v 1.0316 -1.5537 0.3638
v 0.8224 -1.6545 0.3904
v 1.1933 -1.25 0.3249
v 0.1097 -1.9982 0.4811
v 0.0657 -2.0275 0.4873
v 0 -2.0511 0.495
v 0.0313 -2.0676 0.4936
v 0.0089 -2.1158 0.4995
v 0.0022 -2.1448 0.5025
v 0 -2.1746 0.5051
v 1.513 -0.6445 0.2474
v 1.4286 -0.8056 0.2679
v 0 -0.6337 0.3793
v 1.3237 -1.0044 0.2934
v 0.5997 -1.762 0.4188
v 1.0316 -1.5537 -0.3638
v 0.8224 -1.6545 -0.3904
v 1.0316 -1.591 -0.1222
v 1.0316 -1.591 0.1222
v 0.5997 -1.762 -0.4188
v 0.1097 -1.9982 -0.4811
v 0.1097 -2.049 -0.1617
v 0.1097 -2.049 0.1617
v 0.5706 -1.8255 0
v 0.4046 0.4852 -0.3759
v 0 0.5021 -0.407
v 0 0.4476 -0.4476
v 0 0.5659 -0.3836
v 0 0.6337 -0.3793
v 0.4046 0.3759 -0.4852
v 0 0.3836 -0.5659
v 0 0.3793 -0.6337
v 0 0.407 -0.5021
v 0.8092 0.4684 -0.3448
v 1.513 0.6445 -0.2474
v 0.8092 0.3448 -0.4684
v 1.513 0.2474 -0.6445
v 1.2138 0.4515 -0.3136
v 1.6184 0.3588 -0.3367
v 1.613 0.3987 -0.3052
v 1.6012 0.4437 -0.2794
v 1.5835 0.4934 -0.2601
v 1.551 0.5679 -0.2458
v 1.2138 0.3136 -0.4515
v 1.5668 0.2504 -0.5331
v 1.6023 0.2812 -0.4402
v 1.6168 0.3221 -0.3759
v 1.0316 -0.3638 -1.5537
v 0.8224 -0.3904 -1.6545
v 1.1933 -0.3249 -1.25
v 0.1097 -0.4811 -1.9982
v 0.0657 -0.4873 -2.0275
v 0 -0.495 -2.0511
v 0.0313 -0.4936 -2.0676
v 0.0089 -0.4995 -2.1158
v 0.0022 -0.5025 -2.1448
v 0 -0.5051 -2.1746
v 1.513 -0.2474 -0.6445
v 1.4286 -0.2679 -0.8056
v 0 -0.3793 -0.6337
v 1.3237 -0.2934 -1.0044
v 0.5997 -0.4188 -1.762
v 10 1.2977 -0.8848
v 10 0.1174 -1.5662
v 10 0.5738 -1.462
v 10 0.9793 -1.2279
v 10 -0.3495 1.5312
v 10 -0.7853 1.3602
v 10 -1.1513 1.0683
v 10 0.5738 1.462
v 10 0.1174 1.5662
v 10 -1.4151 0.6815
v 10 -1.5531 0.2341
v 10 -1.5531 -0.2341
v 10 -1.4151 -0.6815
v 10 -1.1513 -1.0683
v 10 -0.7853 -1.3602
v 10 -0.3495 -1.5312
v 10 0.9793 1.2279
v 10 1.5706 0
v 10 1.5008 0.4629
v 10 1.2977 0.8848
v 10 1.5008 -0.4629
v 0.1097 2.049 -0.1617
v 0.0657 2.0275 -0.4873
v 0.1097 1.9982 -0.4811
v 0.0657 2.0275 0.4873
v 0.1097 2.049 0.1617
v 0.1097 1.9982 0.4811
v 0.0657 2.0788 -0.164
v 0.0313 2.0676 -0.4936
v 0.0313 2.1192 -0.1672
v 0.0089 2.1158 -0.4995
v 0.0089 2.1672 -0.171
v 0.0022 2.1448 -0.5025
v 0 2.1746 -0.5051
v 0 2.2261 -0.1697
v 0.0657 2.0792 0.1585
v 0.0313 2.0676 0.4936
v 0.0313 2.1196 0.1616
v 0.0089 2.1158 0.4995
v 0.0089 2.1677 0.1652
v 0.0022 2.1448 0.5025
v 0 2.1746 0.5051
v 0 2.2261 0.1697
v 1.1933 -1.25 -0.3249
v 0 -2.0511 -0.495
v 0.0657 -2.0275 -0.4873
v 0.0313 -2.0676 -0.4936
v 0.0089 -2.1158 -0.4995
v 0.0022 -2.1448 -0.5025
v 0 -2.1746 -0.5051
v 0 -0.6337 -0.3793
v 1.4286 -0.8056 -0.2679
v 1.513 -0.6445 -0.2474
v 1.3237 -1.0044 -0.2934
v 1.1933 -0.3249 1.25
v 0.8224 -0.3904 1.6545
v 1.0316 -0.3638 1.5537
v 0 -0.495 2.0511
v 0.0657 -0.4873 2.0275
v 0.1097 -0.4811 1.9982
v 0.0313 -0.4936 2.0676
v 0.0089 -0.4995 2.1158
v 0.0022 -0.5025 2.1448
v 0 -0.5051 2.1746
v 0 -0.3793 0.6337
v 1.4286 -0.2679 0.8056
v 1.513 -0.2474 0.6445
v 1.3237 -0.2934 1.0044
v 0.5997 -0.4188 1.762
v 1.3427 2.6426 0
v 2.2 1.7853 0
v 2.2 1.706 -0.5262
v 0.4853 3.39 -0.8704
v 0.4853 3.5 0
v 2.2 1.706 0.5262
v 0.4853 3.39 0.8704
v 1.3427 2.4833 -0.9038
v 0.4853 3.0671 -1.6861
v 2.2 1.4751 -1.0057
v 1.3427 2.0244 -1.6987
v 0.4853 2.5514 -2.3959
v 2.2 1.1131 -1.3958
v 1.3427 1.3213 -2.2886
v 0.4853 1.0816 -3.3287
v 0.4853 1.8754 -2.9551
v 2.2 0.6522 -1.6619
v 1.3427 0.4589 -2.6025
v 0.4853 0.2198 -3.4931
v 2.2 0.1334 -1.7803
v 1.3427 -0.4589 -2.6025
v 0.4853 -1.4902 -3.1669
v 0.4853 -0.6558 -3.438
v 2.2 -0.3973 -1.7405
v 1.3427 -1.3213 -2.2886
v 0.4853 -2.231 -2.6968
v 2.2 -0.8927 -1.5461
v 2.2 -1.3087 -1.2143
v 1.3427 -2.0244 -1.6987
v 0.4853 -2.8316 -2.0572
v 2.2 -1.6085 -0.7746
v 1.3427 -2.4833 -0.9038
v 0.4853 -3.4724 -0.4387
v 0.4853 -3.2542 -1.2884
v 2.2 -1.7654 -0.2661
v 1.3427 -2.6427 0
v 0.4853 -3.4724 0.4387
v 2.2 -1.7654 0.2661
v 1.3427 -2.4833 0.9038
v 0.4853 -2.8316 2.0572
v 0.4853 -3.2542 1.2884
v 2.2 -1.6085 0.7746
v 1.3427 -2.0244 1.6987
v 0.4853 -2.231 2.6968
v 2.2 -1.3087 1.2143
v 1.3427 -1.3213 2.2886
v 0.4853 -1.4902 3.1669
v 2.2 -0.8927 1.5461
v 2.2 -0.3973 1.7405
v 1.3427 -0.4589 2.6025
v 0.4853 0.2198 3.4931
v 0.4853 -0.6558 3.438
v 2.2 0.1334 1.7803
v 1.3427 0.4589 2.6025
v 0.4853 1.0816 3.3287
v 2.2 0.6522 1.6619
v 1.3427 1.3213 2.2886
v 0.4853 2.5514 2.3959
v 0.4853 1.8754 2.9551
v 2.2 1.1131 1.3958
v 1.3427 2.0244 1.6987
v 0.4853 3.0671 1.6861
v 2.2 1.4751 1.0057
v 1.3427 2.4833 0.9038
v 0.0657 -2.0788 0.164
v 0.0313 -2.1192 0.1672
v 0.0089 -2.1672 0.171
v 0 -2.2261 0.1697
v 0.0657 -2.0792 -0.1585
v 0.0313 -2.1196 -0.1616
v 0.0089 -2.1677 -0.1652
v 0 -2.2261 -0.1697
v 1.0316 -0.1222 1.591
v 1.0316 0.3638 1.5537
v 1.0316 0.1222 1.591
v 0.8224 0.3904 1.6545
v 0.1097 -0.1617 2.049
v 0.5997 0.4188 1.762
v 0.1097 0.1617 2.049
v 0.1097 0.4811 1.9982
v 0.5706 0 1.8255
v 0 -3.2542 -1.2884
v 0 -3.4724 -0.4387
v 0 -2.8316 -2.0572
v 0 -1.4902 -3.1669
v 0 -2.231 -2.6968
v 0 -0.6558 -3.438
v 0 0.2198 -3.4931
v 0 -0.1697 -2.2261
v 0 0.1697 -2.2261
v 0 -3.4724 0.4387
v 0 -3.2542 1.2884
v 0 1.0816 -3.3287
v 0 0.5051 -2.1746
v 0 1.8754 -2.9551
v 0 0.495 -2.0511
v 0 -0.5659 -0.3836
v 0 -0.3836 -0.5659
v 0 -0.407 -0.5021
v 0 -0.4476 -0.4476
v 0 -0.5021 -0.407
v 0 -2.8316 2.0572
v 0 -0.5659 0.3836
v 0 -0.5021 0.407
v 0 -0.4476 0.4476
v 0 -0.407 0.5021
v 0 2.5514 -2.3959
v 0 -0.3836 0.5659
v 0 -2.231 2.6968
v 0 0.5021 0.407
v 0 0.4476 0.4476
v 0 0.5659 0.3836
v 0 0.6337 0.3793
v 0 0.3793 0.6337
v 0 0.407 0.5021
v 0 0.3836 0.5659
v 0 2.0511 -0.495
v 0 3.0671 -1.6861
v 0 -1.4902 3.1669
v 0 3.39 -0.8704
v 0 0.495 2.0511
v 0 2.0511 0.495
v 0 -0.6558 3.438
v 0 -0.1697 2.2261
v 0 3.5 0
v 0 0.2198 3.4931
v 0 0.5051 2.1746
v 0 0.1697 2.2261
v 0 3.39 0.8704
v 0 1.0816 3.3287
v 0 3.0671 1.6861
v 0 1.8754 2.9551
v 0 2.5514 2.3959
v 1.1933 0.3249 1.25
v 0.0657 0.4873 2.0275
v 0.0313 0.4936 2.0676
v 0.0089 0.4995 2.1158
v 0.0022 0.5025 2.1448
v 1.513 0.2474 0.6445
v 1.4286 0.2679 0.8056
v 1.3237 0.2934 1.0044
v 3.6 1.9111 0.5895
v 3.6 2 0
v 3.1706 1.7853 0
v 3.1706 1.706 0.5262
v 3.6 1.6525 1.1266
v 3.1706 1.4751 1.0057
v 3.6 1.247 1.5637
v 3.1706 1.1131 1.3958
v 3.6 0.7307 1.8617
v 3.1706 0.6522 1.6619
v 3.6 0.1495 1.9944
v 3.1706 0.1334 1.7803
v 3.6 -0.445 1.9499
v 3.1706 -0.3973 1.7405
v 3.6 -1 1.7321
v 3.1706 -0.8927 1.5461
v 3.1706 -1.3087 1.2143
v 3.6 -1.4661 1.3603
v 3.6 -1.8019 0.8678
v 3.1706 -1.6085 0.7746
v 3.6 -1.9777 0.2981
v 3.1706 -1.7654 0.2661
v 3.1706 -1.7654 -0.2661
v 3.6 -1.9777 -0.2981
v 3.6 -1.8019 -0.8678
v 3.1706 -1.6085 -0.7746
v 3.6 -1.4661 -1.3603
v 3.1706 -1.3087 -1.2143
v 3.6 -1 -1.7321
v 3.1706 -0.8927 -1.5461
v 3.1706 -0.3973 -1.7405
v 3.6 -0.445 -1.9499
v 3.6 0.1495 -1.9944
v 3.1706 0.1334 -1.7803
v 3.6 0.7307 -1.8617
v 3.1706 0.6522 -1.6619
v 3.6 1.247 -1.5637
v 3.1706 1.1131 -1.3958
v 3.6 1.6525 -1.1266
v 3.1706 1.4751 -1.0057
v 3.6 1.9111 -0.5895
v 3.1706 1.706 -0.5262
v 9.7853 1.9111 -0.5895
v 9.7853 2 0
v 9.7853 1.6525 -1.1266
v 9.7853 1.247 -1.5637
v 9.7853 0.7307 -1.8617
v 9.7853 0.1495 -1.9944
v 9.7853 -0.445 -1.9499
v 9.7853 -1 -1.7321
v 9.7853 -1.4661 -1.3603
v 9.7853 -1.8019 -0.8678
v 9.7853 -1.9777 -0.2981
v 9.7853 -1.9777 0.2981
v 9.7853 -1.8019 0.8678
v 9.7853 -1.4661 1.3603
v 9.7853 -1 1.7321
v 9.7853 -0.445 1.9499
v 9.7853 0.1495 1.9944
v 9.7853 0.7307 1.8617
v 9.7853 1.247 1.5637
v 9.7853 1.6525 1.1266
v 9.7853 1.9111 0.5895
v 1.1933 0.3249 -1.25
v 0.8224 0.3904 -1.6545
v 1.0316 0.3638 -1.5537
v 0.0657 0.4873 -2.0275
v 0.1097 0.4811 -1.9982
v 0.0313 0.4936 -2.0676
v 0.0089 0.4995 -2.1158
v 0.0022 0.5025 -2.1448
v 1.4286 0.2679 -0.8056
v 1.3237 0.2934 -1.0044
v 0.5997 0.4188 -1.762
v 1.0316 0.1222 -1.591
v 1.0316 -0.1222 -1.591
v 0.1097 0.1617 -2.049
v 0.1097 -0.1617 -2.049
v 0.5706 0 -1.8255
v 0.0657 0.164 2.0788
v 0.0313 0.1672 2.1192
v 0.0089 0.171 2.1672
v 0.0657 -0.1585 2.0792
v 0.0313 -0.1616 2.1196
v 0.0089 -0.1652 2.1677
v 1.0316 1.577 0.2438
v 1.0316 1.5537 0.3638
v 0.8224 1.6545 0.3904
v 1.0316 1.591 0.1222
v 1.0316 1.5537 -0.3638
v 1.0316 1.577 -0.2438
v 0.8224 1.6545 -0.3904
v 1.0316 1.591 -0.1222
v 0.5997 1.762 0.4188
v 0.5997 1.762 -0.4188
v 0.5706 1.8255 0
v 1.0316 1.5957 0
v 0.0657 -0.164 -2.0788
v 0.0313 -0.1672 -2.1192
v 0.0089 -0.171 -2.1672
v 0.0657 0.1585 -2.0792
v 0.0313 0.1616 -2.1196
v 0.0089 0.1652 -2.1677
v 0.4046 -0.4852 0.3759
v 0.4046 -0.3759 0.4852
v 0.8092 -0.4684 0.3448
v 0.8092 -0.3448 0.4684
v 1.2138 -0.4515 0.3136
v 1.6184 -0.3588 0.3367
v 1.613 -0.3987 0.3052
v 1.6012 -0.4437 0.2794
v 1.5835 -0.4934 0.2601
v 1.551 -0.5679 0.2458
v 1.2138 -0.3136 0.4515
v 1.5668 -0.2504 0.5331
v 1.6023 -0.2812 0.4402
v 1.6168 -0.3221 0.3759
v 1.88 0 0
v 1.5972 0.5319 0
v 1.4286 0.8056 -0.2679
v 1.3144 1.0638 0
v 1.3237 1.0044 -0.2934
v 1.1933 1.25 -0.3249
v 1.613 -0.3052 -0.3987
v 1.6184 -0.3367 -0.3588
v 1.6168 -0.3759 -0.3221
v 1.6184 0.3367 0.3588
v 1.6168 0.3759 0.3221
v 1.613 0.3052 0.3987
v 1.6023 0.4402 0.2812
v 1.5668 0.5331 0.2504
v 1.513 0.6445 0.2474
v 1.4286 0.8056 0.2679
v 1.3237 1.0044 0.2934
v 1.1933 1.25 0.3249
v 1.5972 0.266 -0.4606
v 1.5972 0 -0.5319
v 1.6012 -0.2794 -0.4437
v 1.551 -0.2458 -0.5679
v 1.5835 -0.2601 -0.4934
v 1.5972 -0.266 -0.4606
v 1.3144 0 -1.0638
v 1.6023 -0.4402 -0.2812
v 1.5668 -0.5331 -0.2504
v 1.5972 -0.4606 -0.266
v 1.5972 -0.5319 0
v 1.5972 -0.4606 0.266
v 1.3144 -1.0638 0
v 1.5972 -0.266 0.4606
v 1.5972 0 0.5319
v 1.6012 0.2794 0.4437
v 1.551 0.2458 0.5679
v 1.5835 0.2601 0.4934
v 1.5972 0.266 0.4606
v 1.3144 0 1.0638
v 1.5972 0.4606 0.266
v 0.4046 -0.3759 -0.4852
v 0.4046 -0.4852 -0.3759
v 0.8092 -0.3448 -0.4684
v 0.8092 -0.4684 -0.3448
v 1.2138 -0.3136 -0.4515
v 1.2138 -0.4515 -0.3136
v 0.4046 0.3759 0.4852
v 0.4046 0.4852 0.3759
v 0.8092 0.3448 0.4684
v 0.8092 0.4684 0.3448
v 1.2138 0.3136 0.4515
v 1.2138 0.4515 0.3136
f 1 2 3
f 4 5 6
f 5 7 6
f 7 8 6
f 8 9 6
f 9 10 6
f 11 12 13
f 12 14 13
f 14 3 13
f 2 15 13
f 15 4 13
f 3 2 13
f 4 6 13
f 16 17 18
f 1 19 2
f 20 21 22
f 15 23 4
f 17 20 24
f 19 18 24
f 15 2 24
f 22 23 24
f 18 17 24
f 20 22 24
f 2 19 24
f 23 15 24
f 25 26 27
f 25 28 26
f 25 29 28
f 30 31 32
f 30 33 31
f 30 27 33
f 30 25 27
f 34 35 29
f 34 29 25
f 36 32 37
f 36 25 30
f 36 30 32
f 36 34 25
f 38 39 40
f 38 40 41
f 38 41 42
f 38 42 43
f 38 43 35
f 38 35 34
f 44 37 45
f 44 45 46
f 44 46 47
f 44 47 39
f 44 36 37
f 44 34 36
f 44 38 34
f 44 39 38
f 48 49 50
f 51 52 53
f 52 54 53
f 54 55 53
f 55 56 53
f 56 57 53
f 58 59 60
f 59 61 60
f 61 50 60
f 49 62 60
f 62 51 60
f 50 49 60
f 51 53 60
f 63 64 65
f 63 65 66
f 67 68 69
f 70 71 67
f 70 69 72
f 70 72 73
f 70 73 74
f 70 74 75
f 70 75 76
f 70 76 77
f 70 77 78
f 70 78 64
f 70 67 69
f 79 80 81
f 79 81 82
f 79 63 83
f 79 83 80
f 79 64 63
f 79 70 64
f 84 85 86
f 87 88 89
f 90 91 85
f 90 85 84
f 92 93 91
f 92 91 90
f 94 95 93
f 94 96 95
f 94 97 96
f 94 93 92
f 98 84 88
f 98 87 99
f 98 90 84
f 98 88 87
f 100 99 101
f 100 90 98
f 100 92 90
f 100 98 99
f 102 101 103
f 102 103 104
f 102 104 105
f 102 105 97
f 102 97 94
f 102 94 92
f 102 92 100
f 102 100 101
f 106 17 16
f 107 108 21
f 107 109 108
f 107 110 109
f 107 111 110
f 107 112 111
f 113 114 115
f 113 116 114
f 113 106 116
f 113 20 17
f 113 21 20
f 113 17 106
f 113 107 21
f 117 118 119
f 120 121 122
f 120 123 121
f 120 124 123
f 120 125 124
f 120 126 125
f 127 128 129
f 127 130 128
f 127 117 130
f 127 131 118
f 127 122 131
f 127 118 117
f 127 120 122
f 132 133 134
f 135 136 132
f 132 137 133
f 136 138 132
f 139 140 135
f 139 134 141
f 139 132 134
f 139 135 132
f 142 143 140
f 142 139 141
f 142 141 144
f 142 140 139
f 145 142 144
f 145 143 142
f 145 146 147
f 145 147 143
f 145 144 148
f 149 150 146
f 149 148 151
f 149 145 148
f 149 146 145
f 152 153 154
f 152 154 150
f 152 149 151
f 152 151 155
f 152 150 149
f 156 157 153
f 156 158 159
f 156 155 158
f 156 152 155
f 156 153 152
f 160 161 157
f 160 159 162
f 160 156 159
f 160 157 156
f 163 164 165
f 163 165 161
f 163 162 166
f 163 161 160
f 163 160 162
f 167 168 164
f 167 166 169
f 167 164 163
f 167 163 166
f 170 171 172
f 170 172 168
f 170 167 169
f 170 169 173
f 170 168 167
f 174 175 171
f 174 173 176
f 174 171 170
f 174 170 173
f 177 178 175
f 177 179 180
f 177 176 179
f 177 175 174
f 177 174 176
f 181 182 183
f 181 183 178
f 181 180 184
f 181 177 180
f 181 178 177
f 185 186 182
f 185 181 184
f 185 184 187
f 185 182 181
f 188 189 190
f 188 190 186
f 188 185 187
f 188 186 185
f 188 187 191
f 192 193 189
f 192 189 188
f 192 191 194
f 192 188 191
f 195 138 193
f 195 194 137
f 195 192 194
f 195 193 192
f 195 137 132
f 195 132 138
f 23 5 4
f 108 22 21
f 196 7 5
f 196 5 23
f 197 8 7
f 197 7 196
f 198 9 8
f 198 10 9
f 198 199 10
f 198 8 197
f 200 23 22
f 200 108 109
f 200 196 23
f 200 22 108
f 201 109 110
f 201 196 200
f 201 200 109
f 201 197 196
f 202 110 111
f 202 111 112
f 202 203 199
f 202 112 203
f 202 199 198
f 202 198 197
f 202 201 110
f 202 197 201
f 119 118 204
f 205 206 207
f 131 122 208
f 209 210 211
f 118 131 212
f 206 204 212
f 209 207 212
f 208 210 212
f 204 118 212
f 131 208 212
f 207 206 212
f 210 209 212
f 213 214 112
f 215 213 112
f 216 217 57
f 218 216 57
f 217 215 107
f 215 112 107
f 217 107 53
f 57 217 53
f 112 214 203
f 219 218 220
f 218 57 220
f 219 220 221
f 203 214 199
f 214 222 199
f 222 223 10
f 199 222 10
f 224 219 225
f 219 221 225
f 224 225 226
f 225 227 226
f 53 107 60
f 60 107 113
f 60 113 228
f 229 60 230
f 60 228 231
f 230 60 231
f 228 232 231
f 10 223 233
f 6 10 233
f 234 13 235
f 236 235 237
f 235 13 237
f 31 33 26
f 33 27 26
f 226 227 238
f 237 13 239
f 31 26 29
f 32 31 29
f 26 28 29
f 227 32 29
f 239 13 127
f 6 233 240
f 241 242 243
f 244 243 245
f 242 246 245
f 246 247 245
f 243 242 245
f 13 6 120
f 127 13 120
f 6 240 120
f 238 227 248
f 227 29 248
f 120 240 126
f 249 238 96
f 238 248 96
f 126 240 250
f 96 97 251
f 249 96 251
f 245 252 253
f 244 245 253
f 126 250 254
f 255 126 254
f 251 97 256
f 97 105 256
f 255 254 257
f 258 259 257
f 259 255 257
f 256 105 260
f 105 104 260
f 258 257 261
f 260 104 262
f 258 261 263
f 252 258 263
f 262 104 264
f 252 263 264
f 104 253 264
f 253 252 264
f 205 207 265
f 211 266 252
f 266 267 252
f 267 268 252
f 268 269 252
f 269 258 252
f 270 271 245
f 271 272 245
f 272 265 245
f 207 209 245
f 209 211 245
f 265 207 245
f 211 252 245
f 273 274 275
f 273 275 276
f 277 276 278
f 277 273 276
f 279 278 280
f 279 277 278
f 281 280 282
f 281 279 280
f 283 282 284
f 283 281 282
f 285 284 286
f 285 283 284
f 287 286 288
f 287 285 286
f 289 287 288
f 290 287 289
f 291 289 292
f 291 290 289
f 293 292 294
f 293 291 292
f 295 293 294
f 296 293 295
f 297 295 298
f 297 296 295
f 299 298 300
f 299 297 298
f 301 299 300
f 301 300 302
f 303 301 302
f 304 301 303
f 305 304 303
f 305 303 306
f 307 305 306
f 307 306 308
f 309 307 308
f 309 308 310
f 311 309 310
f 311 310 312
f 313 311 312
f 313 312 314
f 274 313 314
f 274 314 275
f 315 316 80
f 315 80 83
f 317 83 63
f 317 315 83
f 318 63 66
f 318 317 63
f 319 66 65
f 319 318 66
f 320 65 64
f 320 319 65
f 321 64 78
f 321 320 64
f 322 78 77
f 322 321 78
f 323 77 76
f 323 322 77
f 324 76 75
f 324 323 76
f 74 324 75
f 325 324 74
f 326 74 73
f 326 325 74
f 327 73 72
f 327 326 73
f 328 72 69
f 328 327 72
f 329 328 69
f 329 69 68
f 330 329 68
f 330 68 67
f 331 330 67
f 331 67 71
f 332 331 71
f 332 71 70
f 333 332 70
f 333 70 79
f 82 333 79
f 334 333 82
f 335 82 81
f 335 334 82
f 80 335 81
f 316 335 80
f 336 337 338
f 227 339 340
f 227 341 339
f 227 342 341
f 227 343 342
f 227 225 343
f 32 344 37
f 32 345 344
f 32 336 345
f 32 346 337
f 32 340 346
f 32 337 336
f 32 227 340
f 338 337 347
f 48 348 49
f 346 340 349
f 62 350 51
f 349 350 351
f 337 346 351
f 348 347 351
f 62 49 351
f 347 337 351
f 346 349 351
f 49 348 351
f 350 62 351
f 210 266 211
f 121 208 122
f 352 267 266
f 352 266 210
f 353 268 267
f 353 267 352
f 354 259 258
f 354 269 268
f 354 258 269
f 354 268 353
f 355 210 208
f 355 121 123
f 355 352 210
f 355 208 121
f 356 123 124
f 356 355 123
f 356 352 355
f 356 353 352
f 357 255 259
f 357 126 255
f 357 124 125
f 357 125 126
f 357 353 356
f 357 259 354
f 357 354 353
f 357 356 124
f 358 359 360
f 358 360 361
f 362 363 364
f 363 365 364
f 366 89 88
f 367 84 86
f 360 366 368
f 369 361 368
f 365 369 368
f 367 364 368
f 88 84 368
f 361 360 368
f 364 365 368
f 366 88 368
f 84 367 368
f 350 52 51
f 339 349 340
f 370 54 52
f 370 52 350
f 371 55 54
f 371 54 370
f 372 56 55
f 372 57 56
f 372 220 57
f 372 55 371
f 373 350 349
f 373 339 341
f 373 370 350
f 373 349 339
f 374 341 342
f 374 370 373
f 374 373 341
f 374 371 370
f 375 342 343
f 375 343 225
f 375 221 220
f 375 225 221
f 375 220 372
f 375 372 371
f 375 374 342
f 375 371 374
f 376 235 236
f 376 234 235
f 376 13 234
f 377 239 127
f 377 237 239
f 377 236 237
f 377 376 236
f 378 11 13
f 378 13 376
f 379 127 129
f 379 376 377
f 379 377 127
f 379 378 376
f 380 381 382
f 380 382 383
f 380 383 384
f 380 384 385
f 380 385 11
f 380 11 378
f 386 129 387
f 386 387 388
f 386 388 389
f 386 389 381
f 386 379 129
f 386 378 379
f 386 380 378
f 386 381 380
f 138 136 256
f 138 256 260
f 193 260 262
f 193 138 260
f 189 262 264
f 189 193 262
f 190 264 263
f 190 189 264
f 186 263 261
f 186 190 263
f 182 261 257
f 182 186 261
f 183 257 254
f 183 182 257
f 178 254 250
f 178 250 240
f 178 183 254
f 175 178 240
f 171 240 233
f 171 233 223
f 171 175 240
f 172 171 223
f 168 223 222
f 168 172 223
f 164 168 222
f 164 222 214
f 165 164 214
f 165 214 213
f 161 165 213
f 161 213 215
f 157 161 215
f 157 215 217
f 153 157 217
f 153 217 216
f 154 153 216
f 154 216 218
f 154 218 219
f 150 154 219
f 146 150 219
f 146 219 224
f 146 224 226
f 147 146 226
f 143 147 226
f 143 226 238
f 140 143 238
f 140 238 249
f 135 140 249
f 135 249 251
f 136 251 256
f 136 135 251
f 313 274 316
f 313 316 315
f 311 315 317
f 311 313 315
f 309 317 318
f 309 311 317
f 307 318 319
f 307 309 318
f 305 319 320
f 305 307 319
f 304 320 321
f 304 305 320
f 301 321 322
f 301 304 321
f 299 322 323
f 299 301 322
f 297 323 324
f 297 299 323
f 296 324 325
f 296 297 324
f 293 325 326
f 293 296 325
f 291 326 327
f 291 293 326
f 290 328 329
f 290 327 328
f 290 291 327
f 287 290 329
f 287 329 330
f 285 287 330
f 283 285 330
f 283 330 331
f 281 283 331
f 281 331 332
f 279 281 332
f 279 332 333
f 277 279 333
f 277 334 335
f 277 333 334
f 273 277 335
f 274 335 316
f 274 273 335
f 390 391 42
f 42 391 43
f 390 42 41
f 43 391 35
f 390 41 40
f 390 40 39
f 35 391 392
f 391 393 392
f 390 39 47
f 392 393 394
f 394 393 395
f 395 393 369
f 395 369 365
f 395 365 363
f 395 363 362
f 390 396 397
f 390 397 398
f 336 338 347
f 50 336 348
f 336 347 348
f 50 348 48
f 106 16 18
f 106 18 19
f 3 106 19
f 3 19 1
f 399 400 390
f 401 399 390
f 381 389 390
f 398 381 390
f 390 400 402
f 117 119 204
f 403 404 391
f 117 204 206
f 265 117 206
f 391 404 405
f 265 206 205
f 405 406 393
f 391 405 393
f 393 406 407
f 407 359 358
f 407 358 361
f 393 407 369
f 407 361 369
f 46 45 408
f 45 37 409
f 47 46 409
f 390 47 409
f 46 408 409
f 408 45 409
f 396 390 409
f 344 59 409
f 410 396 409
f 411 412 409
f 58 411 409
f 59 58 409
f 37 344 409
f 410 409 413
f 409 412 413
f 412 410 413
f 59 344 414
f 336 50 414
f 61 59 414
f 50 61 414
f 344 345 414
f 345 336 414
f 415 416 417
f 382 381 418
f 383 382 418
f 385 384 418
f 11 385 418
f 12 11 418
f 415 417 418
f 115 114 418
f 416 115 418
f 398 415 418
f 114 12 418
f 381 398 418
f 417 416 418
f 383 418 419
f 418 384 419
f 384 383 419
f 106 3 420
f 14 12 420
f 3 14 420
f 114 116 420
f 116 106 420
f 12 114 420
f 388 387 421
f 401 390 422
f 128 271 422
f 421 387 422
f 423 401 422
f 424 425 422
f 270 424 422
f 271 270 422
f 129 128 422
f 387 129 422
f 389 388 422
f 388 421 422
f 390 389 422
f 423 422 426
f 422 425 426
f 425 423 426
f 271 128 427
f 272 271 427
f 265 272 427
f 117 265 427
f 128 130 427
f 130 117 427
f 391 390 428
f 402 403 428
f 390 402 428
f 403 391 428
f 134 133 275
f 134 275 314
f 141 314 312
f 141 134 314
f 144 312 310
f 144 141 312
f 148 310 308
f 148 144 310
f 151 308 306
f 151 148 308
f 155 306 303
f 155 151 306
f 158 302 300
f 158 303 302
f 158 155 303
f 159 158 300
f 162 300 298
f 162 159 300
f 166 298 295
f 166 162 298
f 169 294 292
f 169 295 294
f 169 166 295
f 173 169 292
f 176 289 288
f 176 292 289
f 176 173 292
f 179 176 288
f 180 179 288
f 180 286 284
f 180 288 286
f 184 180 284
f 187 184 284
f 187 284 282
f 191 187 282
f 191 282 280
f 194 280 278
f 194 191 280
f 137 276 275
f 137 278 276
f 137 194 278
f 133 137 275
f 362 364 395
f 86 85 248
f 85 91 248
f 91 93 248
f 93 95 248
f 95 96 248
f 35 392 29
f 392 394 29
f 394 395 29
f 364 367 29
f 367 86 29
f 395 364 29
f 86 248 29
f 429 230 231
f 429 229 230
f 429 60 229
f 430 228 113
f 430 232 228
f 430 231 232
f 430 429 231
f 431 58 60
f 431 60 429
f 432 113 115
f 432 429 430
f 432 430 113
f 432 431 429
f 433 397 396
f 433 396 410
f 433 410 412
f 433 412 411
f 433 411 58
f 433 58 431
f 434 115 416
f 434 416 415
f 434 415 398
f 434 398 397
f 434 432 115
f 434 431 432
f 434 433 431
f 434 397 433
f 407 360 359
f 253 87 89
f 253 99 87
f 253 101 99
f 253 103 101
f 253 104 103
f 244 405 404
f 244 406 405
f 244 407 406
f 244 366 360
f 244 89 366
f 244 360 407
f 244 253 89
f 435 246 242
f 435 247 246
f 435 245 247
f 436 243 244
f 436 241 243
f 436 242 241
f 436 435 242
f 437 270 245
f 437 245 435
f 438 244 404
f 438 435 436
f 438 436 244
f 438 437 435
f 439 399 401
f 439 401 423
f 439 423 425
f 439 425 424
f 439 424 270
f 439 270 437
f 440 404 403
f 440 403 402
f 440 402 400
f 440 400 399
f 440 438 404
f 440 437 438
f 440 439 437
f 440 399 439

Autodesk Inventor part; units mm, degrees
ref_plane "YZ Plane" through (0, 0, 0) normal (1, 0, 0) x (0, 1, 0)
ref_plane "XZ Plane" through (0, 0, 0) normal (0, 1, 0) x (-1, 0, 0)
sketch "Sketch1" plane through (0, 0, 0) normal (0, 0, 1) x (1, 0, 0)
  line L0 (1.88, 0) -> (10, 0)
  line L1 (10, 0) -> (10, 2)
  line L2 (10, 2) -> (3.6, 2)
  line L3 (3.6, 2) -> (3.1706, 1.7853)
  line L4 (3.1706, 1.7853) -> (2.2, 1.7853)
  line L5 (0, 3.5) -> (0, 2.11)
  line L6 (0, 2.11) -> (1.0316, 1.5957)
  line L7 (1.0316, 1.5957) -> (1.88, 0)
  line L8 (-2, 0) -> (12, 0) projected
  line L9 (0, -0.7) -> (0, 4.2) projected
  line L10 (0, 3.5) -> (0.4853, 3.5)
  line L11 (0.4853, 3.5) -> (2.2, 1.7853)
  line L12 (3.6, 2) -> (1.9853, 2) construction
  dimension "d1" = 6.4
  dimension "d2" = 4
  dimension "d3" = 3.5706
  dimension "d4" = 4.22
  dimension "d5" = 26.5
  dimension "d6" = 62
  dimension "d7" = 1.88
  dimension "d8" = 0.4294
  dimension "d12" = 7
  dimension "d13" = 45
  dimension "d15" = 10
  dimension "d24" = 2.2
revolve "Body" add sketch "Sketch1" angle 360 about axis through (1.88, 0, 0) along (1, 0, 0) contours L7 L6 L5 L10 L11 L4 L3 L2 L1 L0
sketch "Sketch2" plane through (0, 0, 0) normal (-1, 0, 0) x (0, 0, 1)
  line L0 (0, 2.11) -> (0, 0) construction
  line L1 (0, 0) -> (2.11, 0) construction
  arc A0 (0.633, 0) -> (0, 0.633) centre (0, 0) ccw construction
  arc A1 (0.7385, 0) -> (0, 0.7385) centre (0, 0) ccw construction
  arc A2 (2.0511, 0.495) -> (0.495, 2.0511) centre (0, 0) ccw
  line L2 (0, 0) -> (1.492, 1.492) construction
  line L3 (0.495, 2.0511) -> (0.3793, 0.6337)
  line L4 (2.0511, 0.495) -> (0.6337, 0.3793)
  arc A3 (0.495, 2.0511) -> (0, 2.11) centre (0, 0) ccw
  arc A4 (2.11, 0) -> (2.0511, 0.495) centre (0, 0) ccw
  line L5 (0, -4.9) -> (0, 4.9) projected
  line L6 (-4.9, 0) -> (4.9, 0) projected
  arc A5 (0.495, -2.0511) -> (2.0511, -0.495) centre (0, 0) ccw
  line L7 (0.495, -2.0511) -> (0.3793, -0.6337)
  line L8 (2.0511, -0.495) -> (0.6337, -0.3793)
  arc A6 (0, -2.11) -> (0.495, -2.0511) centre (0, 0) ccw
  arc A7 (2.0511, -0.495) -> (2.11, 0) centre (0, 0) ccw
  arc A8 (-0.495, 2.0511) -> (-2.0511, 0.495) centre (0, 0) ccw
  line L9 (-0.495, 2.0511) -> (-0.3793, 0.6337)
  line L10 (-2.0511, 0.495) -> (-0.6337, 0.3793)
  arc A9 (0, 2.11) -> (-0.495, 2.0511) centre (0, 0) ccw
  arc A10 (-2.0511, 0.495) -> (-2.11, 0) centre (0, 0) ccw
  arc A11 (-0.495, -2.0511) -> (0, -2.11) centre (0, 0) ccw
  arc A12 (-2.0511, -0.495) -> (-0.495, -2.0511) centre (0, 0) ccw
  arc A13 (-2.11, 0) -> (-2.0511, -0.495) centre (0, 0) ccw
  line L11 (-2.0511, -0.495) -> (-0.6337, -0.3793)
  line L12 (-0.495, -2.0511) -> (-0.3793, -0.6337)
  arc A14 (0.3793, 0.6337) -> (0.6337, 0.3793) centre (0.6145, 0.6145) ccw
  arc A15 (0.6337, -0.3793) -> (0.3793, -0.6337) centre (0.6145, -0.6145) ccw
  arc A16 (-0.6337, 0.3793) -> (-0.3793, 0.6337) centre (-0.6145, 0.6145) ccw
  arc A17 (-0.3793, -0.6337) -> (-0.6337, -0.3793) centre (-0.6145, -0.6145) ccw
  point P0 (1.492, -1.492)
  point P1 (-1.492, 1.492)
  point P2 (-1.492, -1.492)
  dimension "d17" = 1.266
  dimension "d18" = 1.477
  dimension "d19" = 4.22
  dimension "d20" = 45
  dimension "d21" = 0.495
extrude "Slot" add sketch "Sketch2" against normal up to next draft 5 contours L4 A14 L3 A2 | A5 L7 A15 L8 | L9 A16 L10 A8 | A12 L11 A17 L12
fillet "Fillet1" radius 0.198 4 edges at (0, 2.11, 0) (0, 0, -2.11) (0, -2.11, 0) (0, 0, 2.11)
thread "Thread" size "M4x0.7" class "6g" standard "ISO Metric profile" length 6.4
chamfer "Chamfer1" distance 0.4294 distance2 0.2147 1 edges at (10, -2, 0) measured on face at (10, -0.499, 0.4421)
ref_plane "Work Plane2" through (3.35, 0, 0) normal (0, 0, -1) x (1, 0, 0)
equation "\"d17\" = 0.3 * SDM"
equation "\"d18\" = 0.35 * SDM"
equation "\"d19\" = SDM"
equation "\"d21\" = 0.5 * SBR"
equation "\"d1\" = GEL"
equation "\"d2\" = GD"
equation "\"d3\" = BDM"
equation "\"d4\" = SDM"
equation "\"d7\" = INTI"
equation "\"d8\" = GAL"
equation "\"d12\" = KOD"
equation "\"d13\" = 0.5 * SEWI"
equation "\"d15\" = NLG"
equation "\"d24\" = KOH"
equation "\"d23\" = 0.2 * SBR"
equation "\"d10\" = GEL"
equation "\"d25\" = -0.5 * SPD + 0.5 * GD"
equation "\"d26\" = 0.5 * GAL"
equation "\"NLG\" = 10"
equation "\"GEL\" = 6.4"
equation "\"GAL\" = 0.61345 * PTC"
equation "\"SPD\" = NND - 1.2269 * PTC"
equation "\"KOD\" = 7"
equation "\"KOH\" = 2.2"
equation "\"SBR\" = 0.99"
equation "\"INTI\" = 1.88"
equation "\"SDM\" = 4.22"
equation "\"GD\" = NND"
equation "\"BDM\" = NND - GAL"
equation "\"SEWI\" = 90deg"
equation "\"d9\" = SDM"
equation "\"GUL\" = 0.61345 * PTC"
equation "\"TOA\" = 30deg"
equation "\"EPV\" = 4.2"
equation "\"THREADDIA\" = 4"
equation "\"RR\" = 0.4"
equation "\"PTC\" = 0.7"
equation "\"NND\" = 4"
equation "\"GD1\" = THREADDIA - 1.2269 * PTC"
properties part number "AS 1427 - M4 x 10" material "Steel, Mild"
